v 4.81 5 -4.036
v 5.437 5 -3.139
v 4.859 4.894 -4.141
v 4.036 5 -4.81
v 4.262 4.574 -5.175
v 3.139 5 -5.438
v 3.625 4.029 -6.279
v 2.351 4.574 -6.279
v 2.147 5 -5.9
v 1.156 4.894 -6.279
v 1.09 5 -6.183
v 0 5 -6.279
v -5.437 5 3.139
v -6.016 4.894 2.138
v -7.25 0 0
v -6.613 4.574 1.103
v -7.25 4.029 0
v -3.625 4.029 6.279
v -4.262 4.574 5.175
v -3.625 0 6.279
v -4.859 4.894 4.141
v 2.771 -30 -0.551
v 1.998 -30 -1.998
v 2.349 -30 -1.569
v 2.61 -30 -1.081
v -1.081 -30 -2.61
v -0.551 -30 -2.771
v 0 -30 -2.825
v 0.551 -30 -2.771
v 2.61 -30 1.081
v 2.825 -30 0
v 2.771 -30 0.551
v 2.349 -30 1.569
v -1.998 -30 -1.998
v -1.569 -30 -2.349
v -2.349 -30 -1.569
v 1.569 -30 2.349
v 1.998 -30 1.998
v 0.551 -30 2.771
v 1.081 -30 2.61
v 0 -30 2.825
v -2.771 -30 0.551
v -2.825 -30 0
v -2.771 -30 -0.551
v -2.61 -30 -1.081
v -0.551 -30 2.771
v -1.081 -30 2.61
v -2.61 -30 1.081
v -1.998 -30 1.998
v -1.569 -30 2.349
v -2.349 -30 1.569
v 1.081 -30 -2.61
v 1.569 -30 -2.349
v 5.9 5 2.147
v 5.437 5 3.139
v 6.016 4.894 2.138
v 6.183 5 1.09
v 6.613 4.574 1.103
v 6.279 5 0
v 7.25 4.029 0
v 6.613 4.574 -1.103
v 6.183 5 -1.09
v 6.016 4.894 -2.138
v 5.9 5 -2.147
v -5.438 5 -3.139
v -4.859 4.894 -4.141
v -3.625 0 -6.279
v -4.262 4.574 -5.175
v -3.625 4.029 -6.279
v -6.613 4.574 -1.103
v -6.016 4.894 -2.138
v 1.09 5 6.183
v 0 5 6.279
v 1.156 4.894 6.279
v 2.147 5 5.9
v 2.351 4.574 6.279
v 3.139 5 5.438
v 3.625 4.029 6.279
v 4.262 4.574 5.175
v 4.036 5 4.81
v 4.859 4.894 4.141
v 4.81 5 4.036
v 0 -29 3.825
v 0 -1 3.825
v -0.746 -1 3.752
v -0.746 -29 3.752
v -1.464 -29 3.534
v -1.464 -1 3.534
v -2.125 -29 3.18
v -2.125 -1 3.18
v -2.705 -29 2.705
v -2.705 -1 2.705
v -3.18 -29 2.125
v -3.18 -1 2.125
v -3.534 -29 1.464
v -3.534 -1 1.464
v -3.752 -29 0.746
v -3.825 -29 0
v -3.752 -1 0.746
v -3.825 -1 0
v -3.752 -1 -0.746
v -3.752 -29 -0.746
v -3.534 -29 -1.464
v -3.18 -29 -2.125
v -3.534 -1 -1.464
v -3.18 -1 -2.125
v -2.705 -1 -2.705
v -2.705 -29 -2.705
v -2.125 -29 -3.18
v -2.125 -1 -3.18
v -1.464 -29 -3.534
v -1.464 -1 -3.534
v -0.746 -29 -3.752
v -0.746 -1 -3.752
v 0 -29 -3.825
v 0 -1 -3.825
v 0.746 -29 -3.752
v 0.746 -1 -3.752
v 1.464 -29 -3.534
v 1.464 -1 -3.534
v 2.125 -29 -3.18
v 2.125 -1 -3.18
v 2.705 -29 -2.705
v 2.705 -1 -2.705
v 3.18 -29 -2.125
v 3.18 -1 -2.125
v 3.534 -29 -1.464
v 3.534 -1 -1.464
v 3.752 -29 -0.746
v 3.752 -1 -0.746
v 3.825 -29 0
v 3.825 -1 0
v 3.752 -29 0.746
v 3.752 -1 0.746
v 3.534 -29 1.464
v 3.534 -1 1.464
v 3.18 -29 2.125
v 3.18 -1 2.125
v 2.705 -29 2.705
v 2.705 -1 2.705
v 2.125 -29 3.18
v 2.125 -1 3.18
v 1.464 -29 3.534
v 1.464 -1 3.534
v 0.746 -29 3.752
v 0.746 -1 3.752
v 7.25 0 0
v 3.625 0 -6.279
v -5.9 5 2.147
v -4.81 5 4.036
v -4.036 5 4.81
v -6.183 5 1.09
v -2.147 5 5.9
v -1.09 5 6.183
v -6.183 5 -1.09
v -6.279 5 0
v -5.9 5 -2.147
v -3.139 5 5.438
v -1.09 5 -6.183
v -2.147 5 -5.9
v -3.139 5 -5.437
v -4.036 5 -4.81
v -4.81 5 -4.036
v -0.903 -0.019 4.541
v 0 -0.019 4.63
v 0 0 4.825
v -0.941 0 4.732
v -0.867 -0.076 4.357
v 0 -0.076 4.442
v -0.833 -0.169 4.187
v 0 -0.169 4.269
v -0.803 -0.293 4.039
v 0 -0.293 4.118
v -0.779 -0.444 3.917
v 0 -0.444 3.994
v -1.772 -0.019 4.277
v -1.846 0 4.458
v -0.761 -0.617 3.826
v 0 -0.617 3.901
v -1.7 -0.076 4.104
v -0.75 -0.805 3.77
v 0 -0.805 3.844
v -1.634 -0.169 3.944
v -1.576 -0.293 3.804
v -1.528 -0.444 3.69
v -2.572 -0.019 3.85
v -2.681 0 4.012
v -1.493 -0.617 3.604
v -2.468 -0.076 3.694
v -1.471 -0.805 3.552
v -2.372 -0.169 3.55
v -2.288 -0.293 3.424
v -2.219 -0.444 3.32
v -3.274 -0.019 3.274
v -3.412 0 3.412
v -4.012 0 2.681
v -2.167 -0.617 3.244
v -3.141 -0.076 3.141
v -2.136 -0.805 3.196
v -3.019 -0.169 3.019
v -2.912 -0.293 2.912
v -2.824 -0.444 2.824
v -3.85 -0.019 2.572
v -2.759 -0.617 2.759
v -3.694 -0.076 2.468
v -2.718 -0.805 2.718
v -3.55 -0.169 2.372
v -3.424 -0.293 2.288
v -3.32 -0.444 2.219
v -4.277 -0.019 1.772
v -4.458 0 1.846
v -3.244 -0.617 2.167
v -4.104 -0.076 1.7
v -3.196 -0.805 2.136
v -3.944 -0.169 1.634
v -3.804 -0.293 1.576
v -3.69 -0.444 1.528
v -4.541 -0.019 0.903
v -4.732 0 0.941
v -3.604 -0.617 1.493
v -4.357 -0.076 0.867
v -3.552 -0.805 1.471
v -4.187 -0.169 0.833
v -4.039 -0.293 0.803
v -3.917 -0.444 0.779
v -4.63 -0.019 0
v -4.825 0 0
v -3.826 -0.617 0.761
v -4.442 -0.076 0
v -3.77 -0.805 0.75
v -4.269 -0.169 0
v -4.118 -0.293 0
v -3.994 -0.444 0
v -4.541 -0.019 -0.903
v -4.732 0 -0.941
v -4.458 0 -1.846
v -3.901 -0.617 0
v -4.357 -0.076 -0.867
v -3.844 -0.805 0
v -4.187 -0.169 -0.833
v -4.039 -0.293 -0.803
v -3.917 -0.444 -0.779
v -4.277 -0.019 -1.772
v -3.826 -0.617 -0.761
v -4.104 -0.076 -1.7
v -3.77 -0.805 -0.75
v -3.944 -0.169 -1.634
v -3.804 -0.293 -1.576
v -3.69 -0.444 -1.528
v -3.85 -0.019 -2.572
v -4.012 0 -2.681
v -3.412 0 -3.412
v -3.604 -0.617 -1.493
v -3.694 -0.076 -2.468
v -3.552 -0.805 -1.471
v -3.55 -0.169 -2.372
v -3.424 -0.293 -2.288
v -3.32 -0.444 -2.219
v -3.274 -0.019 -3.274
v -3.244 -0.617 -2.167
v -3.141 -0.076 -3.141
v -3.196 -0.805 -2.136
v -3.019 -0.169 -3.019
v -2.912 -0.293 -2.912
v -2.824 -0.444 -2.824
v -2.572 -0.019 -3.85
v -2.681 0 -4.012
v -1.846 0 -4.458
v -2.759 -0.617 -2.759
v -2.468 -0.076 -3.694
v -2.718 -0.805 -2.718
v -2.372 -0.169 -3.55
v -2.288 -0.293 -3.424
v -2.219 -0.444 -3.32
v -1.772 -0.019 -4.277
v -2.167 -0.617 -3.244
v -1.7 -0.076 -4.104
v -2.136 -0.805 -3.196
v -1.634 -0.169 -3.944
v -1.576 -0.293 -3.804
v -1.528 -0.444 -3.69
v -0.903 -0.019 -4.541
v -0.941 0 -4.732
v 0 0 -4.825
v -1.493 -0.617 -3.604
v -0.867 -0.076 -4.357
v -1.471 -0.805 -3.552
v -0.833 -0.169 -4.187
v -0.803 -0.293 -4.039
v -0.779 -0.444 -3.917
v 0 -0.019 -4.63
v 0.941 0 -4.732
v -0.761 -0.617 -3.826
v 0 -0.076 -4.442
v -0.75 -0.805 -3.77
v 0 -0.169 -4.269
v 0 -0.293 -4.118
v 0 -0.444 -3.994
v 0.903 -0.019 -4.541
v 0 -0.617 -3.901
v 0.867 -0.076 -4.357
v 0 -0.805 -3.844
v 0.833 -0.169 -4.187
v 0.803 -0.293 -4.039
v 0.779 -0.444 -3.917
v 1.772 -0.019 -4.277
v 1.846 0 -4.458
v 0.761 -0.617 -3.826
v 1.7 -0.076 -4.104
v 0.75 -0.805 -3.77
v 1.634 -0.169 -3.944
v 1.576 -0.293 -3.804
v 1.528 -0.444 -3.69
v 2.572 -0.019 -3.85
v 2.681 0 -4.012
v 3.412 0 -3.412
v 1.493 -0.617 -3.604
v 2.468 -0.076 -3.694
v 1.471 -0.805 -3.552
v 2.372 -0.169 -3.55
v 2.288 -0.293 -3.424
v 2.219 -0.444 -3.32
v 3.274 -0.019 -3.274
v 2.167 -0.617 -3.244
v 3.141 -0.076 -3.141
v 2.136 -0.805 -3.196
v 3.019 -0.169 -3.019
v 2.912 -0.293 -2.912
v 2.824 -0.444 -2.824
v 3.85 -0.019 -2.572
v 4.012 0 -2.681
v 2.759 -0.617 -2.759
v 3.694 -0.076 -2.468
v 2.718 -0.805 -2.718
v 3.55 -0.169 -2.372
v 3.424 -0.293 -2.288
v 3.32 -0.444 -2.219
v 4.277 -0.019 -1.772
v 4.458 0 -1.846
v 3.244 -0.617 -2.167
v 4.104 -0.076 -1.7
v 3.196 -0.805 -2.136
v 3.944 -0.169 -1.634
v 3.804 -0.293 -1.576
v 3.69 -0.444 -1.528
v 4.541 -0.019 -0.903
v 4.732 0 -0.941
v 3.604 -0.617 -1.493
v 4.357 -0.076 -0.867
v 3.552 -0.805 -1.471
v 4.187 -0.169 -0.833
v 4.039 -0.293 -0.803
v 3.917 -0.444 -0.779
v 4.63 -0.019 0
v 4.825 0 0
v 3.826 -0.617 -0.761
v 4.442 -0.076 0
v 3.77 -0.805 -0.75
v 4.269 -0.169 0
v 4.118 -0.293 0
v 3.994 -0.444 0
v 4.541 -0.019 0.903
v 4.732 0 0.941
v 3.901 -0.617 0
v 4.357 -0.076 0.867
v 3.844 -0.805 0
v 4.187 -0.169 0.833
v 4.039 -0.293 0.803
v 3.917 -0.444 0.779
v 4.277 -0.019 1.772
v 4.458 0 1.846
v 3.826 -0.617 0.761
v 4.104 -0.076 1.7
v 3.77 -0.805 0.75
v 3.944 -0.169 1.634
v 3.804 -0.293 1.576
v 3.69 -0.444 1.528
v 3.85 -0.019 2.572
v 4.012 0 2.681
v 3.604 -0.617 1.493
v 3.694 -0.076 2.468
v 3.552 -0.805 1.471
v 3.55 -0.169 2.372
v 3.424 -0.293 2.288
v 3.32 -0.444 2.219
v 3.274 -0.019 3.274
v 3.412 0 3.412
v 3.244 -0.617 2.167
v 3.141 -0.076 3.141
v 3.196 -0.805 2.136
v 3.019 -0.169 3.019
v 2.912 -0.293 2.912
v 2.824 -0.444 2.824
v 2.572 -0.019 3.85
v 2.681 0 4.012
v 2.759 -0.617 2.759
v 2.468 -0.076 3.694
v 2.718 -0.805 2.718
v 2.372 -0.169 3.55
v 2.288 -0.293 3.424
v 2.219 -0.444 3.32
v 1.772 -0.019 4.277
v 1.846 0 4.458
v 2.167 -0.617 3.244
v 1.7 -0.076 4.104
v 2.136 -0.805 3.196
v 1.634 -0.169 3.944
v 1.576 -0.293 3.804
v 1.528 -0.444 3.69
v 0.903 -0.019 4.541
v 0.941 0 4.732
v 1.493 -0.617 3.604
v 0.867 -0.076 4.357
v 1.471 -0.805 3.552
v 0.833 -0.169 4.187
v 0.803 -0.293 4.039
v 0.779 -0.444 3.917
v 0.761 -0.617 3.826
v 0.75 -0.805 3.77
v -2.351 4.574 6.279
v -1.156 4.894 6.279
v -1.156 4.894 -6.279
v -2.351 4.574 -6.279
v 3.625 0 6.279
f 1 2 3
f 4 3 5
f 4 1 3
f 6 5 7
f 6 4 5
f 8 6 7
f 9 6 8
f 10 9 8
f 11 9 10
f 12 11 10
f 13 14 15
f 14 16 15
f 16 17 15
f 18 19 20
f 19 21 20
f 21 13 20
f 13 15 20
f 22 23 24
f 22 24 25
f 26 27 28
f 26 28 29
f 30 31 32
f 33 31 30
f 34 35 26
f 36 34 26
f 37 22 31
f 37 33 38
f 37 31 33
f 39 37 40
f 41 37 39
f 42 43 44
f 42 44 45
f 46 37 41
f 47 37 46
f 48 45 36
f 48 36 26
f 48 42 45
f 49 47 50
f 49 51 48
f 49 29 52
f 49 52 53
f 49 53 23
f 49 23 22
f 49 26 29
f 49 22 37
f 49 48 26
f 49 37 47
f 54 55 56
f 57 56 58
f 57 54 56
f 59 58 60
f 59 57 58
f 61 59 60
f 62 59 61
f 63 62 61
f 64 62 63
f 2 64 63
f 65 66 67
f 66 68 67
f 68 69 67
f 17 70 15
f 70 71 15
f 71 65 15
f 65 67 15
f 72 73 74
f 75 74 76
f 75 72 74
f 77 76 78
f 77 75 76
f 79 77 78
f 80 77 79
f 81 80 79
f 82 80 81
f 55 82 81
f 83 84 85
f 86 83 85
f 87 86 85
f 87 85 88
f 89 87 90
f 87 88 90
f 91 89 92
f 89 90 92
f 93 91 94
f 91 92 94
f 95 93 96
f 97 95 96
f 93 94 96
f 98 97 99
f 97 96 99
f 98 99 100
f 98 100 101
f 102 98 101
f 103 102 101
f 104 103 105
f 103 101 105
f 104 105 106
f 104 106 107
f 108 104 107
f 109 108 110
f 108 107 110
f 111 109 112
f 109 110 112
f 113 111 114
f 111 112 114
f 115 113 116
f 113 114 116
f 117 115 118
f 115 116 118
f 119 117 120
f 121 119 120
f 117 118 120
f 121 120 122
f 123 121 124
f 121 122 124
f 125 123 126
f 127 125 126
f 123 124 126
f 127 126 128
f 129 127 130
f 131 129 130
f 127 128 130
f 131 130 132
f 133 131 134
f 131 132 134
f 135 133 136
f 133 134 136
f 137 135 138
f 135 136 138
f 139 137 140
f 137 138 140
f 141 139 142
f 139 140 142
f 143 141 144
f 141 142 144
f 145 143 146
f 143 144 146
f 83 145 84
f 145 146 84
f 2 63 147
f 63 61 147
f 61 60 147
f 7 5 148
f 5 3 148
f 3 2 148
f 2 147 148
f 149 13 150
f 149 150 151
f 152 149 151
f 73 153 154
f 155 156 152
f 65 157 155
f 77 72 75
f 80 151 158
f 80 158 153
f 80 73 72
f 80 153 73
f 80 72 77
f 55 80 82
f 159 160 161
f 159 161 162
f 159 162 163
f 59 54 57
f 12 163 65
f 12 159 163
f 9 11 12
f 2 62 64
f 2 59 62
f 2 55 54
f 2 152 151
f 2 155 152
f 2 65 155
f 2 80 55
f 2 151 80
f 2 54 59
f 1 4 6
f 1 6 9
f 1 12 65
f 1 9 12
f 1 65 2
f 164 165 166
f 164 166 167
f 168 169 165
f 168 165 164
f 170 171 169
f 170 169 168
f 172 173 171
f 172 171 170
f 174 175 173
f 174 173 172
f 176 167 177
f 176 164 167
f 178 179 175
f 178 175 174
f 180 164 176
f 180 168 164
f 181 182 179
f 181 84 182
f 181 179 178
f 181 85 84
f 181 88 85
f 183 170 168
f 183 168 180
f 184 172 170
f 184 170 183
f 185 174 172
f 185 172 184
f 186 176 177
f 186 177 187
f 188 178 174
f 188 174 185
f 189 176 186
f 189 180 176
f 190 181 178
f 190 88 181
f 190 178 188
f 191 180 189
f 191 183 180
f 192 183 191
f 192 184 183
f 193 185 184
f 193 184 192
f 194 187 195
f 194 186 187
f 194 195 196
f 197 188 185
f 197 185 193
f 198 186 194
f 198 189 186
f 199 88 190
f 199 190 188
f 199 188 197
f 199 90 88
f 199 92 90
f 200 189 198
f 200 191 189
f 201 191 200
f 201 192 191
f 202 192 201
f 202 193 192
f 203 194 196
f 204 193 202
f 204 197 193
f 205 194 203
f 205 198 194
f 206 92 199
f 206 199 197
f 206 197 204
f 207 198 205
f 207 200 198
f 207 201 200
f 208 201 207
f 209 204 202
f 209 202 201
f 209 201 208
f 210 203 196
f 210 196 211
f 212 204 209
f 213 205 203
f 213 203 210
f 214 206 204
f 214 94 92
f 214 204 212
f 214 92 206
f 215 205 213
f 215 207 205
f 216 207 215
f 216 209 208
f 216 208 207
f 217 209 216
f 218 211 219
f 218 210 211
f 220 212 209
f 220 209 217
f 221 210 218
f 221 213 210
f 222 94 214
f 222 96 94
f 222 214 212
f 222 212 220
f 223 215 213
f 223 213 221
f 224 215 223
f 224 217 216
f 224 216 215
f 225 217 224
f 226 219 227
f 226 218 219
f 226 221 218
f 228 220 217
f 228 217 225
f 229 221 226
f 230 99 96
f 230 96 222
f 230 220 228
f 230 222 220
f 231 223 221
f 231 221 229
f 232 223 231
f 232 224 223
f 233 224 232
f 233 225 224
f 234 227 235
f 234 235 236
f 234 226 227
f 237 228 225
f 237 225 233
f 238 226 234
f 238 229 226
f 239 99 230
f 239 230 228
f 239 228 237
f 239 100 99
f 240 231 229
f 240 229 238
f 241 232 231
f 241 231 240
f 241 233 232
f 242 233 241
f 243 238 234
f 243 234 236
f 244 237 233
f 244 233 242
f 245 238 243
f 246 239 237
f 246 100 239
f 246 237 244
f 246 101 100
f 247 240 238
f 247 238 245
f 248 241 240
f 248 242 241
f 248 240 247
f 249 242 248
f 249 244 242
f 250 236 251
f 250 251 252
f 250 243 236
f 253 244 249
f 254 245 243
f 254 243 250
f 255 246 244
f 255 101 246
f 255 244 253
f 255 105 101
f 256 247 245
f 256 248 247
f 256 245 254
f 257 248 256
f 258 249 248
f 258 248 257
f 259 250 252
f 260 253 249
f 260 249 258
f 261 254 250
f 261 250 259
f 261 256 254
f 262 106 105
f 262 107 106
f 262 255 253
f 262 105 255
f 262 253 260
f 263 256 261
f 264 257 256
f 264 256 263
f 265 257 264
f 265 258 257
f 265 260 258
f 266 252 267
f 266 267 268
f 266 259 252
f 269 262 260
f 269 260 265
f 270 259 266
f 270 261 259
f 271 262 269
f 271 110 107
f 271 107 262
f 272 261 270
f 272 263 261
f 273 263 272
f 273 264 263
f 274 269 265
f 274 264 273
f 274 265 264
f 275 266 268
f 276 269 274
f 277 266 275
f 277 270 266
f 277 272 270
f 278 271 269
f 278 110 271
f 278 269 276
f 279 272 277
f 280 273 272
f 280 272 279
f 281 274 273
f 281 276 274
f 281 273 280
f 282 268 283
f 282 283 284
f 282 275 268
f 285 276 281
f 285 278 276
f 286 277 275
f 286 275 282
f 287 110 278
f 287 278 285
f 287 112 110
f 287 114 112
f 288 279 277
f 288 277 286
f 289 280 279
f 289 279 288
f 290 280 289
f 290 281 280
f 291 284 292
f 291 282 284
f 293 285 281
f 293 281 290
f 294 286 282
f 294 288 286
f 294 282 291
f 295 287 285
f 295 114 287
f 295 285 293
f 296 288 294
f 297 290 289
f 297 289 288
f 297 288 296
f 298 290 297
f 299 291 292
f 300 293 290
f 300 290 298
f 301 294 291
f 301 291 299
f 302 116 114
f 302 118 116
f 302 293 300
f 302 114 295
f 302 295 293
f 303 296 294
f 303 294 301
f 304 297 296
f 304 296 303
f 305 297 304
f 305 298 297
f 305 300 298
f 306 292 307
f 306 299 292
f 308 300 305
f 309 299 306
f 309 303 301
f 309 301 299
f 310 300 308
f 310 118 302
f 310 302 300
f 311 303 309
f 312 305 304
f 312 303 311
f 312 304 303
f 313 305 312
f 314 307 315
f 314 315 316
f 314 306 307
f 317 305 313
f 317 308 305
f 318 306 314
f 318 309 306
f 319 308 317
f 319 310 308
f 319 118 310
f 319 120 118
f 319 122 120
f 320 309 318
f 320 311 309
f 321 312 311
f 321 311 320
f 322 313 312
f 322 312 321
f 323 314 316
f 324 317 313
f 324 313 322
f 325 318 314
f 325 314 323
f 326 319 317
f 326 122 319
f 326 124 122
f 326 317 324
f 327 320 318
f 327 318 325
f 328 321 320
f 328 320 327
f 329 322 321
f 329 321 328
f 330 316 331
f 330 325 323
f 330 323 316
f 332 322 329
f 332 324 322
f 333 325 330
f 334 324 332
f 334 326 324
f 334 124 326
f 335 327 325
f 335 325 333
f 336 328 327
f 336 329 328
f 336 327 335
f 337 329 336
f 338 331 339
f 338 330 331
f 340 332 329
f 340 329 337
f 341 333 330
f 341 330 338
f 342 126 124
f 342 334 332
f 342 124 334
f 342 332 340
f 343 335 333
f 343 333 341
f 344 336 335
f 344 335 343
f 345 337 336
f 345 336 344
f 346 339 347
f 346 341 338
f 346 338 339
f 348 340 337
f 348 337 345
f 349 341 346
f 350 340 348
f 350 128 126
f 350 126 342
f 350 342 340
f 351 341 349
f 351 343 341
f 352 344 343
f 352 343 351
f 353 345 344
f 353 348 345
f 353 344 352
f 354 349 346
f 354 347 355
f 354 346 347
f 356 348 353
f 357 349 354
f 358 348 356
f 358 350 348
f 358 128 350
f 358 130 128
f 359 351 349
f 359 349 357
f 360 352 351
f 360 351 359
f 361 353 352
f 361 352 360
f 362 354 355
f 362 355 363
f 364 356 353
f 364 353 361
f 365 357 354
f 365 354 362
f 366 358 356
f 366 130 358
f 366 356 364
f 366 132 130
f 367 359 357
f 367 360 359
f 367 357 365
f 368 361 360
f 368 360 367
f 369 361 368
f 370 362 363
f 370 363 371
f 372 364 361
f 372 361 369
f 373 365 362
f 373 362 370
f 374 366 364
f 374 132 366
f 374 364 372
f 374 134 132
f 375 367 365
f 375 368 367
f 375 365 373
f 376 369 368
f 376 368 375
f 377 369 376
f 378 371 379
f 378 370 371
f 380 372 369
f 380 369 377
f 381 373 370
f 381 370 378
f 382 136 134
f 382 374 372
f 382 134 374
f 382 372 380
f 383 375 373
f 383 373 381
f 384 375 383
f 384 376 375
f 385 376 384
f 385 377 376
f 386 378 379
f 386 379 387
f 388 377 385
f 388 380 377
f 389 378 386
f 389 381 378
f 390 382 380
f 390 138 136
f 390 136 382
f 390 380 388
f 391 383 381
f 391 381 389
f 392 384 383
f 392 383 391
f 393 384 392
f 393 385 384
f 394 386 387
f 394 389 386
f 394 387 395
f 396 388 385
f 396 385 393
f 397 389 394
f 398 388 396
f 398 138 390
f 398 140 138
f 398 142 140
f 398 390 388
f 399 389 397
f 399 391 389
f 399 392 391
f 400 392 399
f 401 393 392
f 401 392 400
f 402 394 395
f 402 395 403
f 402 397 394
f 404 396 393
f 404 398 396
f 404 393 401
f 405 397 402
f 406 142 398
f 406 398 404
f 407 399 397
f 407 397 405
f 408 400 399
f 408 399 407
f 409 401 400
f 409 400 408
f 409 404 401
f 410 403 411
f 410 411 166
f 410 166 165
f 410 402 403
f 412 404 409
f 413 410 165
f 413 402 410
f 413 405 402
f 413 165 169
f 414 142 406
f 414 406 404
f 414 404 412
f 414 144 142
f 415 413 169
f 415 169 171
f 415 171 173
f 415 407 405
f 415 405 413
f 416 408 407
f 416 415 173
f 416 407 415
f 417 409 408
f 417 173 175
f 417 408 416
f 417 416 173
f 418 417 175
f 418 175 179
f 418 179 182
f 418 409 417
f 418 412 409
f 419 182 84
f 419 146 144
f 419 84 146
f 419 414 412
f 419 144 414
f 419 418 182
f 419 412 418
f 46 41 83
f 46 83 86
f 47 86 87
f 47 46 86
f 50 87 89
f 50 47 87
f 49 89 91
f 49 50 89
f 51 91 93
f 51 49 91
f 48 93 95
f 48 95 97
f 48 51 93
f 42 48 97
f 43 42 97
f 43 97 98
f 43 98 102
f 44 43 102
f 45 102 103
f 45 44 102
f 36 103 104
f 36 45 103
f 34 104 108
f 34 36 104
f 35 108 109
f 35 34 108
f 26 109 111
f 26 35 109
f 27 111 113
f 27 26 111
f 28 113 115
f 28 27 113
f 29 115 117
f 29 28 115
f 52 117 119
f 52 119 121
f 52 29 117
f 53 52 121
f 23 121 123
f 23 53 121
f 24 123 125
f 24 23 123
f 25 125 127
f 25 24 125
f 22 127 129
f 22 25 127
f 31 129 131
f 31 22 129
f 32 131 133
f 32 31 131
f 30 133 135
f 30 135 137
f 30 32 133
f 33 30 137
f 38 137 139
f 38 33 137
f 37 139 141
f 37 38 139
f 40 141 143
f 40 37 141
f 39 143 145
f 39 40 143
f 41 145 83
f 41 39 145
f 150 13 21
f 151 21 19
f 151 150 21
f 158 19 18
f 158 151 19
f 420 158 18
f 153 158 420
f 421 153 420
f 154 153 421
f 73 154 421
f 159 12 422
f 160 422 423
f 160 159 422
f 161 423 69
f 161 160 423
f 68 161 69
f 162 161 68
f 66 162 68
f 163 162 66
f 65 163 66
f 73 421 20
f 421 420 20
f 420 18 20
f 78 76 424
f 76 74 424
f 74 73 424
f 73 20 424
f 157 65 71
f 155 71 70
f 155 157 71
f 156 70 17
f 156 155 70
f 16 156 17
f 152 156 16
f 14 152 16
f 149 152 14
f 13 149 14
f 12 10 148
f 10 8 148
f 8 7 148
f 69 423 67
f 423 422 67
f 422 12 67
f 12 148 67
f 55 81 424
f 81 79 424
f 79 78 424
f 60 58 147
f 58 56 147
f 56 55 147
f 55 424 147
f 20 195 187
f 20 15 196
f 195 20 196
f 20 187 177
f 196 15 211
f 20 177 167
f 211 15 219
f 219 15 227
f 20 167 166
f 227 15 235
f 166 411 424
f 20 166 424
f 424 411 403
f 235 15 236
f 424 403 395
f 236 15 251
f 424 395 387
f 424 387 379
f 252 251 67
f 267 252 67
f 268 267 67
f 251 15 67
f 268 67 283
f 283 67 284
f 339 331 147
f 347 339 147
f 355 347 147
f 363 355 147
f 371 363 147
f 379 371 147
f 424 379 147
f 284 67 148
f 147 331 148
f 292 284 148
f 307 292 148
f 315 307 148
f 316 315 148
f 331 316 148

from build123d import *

# Parameters (mm, degrees)
EXTRUDE_1_DEPTH     = 5
SKETCH_8_OUTSIDE_W  = 22.464
SKETCH_8_OUTSIDE_H  = 20.522
SKETCH_8_OUTSIDE_R  = 6.278684177
CUT_EXTRUDE_1_DEPTH = 1
CUT_EXTRUDE_1_DRAFT = -45
SKETCH_9_R          = 3.825
BOLT_LENGTH_DEPTH   = 30
FILLET_1_R          = 1
CHAMFER_1_SIZE      = 1


with BuildPart() as part:
    # Эскиз6 → Бобышка-Вытянуть1 (new body)
    with BuildSketch(Plane(origin=(0, 0, 0), x_dir=(1, 0, 0), z_dir=(0, 1, 0))):
        Polygon((7.25, 0), (3.625, 6.278684177), (-3.625, 6.278684177), (-7.25, 0), (-3.625, -6.278684177), (3.625, -6.278684177), align=None)
    extrude(amount=EXTRUDE_1_DEPTH)


with BuildPart() as cut_extrude_1_tool:
    # Эскиз8 outside → Вырез-Вытянуть1 (with draft: the straight prism first)
    with BuildSketch(Plane(origin=(0, 5, 0), x_dir=(1, 0, 0), z_dir=(0, 1, 0))):
        Rectangle(SKETCH_8_OUTSIDE_W, SKETCH_8_OUTSIDE_H)
        Circle(SKETCH_8_OUTSIDE_R, mode=Mode.SUBTRACT)
    extrude(amount=-CUT_EXTRUDE_1_DEPTH)
    # Вырез-Вытянуть1: the draft: its side faces are tilted about the plane it starts from
    cut_extrude_1_sides = [cut_extrude_1_tool.faces().sort_by_distance(p)[0] for p in [
        (0, 4.5, 10.261),
        (11.232, 4.5, 0),
        (0, 4.5, -10.261),
        (-11.232, 4.5, 0),
        (-6.278684177, 4.5, 0),
    ]]
    draft(cut_extrude_1_sides, Plane(origin=(0, 5, 0), x_dir=(1, 0, 0), z_dir=(0, 1, 0)), CUT_EXTRUDE_1_DRAFT)


with BuildPart() as part_1:
    add(part.part)

    # Вырез-Вытянуть1: cut by cut_extrude_1_tool
    add(cut_extrude_1_tool.part, mode=Mode.SUBTRACT)

    # Эскиз9 → bolt length (add)
    with BuildSketch(Plane.XZ):
        with Locations(Location((0, 0, 0), (0, 0, 90))):  # turned: the seam where the file's is
            Circle(SKETCH_9_R)
    extrude(amount=BOLT_LENGTH_DEPTH)

    # Скругление1
    fillet_1_edges = [part_1.edges().sort_by_distance(p)[0] for p in [
        (0, 0, -3.825),
    ]]
    fillet(fillet_1_edges, radius=FILLET_1_R)

    # Фаска1
    chamfer_1_edges = [part_1.edges().sort_by_distance(p)[0] for p in [
        (0, -30, -3.825),
    ]]
    chamfer(chamfer_1_edges, length=CHAMFER_1_SIZE)


solid = part_1.part
